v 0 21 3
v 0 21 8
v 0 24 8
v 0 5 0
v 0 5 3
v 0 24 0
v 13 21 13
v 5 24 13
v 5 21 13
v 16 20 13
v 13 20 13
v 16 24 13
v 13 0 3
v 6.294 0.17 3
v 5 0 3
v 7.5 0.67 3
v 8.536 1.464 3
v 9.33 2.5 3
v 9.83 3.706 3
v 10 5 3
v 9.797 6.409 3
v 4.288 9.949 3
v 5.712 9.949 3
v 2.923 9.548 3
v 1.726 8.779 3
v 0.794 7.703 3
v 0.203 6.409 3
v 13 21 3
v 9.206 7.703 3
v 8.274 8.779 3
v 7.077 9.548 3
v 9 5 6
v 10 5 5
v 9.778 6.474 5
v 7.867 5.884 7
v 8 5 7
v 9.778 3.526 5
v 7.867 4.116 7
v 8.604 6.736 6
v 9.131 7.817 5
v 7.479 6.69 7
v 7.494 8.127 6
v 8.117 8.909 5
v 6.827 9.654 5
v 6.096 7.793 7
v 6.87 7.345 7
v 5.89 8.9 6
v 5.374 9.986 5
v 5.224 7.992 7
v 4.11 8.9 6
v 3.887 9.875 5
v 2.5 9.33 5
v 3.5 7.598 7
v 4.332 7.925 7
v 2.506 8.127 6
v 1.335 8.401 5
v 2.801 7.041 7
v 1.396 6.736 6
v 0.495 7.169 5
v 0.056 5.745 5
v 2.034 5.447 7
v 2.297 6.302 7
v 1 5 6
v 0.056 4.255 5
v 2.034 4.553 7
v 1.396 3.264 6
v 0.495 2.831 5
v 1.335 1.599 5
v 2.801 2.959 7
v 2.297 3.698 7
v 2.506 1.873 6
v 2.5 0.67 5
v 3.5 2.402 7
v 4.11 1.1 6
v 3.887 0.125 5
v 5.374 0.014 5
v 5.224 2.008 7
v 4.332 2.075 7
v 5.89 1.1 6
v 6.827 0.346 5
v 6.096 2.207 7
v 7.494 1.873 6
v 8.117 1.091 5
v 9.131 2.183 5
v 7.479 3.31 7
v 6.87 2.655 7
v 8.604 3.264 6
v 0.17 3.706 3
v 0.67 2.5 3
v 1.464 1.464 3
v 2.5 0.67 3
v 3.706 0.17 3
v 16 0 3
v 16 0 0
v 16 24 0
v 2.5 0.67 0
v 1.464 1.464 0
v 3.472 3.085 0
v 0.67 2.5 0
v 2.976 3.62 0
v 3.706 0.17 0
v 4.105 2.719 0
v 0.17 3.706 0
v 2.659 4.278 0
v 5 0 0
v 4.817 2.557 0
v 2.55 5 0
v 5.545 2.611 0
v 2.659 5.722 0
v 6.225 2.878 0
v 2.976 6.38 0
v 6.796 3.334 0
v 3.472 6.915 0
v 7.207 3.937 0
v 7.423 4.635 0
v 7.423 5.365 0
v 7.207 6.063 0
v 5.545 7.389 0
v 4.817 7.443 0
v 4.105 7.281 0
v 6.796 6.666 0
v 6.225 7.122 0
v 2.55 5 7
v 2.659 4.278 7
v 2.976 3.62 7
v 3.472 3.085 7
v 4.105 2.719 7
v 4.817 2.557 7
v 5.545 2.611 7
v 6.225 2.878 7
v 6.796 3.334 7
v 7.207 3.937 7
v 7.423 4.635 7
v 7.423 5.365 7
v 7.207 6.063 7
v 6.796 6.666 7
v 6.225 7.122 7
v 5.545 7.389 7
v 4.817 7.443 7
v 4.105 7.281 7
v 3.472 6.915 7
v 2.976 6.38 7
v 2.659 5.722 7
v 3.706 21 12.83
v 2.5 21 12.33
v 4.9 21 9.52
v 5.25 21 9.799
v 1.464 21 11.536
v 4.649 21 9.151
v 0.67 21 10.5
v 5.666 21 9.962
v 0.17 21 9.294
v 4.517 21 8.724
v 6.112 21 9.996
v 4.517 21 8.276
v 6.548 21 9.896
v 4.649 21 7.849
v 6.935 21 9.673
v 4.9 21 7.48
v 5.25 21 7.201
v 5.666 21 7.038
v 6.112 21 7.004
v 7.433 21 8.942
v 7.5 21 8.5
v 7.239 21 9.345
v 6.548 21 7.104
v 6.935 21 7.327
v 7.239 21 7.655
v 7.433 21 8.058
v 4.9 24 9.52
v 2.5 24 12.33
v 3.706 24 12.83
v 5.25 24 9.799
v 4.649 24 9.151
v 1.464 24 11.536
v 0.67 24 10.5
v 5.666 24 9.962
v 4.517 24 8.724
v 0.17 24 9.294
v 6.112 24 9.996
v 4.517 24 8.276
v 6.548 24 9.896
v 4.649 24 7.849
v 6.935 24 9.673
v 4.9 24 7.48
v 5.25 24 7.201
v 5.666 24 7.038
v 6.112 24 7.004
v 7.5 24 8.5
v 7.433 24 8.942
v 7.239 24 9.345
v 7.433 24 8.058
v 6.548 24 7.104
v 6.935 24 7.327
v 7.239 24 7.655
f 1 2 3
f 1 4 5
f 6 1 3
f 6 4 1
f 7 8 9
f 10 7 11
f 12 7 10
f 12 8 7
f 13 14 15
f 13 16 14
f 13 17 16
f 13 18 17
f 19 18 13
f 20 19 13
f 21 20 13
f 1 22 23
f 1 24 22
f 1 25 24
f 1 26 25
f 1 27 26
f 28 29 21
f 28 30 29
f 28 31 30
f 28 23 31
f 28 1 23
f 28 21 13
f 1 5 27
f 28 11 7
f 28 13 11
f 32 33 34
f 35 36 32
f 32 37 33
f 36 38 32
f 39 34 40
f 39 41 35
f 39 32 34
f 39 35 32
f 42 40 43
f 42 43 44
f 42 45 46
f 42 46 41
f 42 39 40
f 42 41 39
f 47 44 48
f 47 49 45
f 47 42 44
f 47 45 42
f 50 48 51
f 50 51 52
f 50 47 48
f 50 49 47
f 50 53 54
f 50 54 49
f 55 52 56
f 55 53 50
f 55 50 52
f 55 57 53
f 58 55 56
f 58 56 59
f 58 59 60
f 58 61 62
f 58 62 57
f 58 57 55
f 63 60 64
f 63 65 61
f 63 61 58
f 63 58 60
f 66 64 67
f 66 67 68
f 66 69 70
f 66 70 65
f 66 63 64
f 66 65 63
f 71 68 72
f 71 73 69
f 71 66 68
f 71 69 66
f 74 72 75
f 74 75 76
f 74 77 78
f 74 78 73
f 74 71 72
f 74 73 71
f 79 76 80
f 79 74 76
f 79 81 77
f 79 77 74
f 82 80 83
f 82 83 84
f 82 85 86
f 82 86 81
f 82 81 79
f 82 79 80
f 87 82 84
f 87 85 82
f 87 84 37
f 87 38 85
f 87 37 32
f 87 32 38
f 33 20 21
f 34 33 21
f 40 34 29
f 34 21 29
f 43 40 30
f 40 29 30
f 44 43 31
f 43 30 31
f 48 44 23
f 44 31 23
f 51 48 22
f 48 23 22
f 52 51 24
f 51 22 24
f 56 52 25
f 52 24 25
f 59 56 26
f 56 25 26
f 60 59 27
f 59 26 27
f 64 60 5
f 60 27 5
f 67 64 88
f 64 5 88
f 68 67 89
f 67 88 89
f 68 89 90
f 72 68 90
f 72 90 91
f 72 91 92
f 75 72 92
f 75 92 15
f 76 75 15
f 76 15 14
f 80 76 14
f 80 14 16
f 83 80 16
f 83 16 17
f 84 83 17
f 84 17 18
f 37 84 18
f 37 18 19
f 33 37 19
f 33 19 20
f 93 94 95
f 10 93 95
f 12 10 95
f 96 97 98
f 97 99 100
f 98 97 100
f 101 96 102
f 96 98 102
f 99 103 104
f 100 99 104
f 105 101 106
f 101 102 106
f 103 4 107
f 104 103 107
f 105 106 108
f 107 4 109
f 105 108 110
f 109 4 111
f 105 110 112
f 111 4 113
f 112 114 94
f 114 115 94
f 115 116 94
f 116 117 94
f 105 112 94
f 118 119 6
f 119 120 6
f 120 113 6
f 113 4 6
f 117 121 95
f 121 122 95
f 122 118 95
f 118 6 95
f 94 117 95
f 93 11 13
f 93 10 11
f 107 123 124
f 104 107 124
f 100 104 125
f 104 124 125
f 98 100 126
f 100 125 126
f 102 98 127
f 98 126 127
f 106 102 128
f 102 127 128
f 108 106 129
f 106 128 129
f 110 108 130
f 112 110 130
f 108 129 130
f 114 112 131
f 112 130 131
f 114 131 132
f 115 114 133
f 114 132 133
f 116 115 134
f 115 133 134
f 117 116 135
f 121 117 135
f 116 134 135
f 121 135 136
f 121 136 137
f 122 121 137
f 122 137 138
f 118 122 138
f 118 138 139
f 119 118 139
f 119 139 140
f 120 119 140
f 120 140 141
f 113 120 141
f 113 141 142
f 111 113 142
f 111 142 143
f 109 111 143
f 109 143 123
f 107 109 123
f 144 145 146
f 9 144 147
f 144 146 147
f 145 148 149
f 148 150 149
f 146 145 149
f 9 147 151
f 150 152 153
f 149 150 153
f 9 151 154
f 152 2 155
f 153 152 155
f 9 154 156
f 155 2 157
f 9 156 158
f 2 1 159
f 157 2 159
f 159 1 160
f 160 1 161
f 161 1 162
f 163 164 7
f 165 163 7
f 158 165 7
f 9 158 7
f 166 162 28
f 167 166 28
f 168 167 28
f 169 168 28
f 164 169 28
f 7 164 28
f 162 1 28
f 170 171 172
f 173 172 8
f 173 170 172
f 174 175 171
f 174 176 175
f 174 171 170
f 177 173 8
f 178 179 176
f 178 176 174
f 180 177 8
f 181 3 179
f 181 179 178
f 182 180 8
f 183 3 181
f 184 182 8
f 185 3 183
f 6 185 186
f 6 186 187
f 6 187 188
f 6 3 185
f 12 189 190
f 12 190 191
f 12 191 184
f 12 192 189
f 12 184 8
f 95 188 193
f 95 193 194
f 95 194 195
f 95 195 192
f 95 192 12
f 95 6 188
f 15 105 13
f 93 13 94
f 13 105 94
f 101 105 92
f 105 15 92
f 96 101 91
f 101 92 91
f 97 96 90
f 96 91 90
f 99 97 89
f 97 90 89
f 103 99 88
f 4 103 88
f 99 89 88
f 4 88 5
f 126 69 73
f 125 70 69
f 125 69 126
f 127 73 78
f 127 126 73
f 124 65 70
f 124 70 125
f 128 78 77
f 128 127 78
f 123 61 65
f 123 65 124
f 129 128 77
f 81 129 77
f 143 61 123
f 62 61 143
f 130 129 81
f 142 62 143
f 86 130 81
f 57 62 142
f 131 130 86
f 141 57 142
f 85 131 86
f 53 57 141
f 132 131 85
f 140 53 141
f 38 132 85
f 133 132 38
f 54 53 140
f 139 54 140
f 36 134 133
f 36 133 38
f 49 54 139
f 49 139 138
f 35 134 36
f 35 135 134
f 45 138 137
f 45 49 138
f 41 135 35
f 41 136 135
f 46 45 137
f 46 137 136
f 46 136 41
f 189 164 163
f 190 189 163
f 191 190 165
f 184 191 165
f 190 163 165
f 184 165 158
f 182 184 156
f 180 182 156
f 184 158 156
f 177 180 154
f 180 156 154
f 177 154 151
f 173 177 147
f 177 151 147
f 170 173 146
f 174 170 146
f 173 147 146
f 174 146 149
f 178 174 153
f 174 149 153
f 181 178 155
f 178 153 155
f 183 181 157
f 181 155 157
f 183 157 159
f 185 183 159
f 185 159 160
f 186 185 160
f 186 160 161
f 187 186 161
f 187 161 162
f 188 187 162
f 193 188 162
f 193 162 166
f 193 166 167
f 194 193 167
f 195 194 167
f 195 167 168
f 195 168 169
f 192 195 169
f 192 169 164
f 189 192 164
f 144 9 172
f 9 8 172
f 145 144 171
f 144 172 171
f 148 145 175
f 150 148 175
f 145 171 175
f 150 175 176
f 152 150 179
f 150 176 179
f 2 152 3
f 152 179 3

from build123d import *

# Parameters (mm, degrees)
F0_W     = 16
F0_H     = 24
F1_DEPTH = 13
F2_T     = -3
F3_R     = 5
F4_DEPTH = 4
F5_D     = 4.9
F6_SIZE2 = 10
F6_SIZE  = 20
F7_R     = 5
F8_SIZE  = 2
F10_D    = 3
F11_R    = 4.9999


# Not quite as in the source:
# - a fillet or chamfer is up to 0.001 mm smaller than in the source, because OpenCascade refuses the exact size


with BuildPart() as f1:
    # F0 (on Top) → F1 (new body)
    with BuildSketch(Plane.XY):
        with Locations((8, 12)):
            Rectangle(F0_W, F0_H)
    extrude(amount=F1_DEPTH)

    # F2
    f2_openings = [f1.faces().sort_by_distance(p)[0] for p in [
        (8, 0, 6.5),
        (0, 12, 6.5),
        (8, 12, 13),
    ]]
    offset(amount=F2_T, openings=f2_openings)

    # F3 (on face) → F4 (join)
    with BuildSketch(Plane.XY.offset(3)):
        with Locations((5, 5)):
            Circle(F3_R)
    extrude(amount=F4_DEPTH)

    # F5 (through all)
    with Locations(Plane(origin=(0, 0, 0), x_dir=(1, 0, 0), z_dir=(0, 0, -1))):
        with Locations((5, -5)):
            Hole(F5_D / 2)

    # F6
    f6_edges = [f1.edges().sort_by_distance(p)[0] for p in [
        (14.5, 0, 13),
    ]]
    f6_side = f1.faces().sort_by_distance((8, 23.711556, 13))[0]
    chamfer(f6_edges, length=F6_SIZE, length2=F6_SIZE2, reference=f6_side)

    # F7
    f7_edges = [f1.edges().sort_by_distance(p)[0] for p in [
        (0, 22.5, 13),
    ]]
    fillet(f7_edges, radius=F7_R)

    # F8
    f8_edges = [f1.edges().sort_by_distance(p)[0] for p in [
        (0, 5, 7),
    ]]
    chamfer(f8_edges, length=F8_SIZE)

    # F10 (through all)
    with Locations(Plane(origin=(0, 24, 0), x_dir=(-1, 0, 0), z_dir=(0, 1, 0))):
        with Locations((-6, 8.5)):
            Hole(F10_D / 2)

    # F11 (radius 5 in the source; OpenCascade refuses exactly that, so slightly less here)
    f11_edges = [f1.edges().sort_by_distance(p)[0] for p in [
        (0, 0, 1.5),
    ]]
    fillet(f11_edges, radius=F11_R)


solid = f1.part
